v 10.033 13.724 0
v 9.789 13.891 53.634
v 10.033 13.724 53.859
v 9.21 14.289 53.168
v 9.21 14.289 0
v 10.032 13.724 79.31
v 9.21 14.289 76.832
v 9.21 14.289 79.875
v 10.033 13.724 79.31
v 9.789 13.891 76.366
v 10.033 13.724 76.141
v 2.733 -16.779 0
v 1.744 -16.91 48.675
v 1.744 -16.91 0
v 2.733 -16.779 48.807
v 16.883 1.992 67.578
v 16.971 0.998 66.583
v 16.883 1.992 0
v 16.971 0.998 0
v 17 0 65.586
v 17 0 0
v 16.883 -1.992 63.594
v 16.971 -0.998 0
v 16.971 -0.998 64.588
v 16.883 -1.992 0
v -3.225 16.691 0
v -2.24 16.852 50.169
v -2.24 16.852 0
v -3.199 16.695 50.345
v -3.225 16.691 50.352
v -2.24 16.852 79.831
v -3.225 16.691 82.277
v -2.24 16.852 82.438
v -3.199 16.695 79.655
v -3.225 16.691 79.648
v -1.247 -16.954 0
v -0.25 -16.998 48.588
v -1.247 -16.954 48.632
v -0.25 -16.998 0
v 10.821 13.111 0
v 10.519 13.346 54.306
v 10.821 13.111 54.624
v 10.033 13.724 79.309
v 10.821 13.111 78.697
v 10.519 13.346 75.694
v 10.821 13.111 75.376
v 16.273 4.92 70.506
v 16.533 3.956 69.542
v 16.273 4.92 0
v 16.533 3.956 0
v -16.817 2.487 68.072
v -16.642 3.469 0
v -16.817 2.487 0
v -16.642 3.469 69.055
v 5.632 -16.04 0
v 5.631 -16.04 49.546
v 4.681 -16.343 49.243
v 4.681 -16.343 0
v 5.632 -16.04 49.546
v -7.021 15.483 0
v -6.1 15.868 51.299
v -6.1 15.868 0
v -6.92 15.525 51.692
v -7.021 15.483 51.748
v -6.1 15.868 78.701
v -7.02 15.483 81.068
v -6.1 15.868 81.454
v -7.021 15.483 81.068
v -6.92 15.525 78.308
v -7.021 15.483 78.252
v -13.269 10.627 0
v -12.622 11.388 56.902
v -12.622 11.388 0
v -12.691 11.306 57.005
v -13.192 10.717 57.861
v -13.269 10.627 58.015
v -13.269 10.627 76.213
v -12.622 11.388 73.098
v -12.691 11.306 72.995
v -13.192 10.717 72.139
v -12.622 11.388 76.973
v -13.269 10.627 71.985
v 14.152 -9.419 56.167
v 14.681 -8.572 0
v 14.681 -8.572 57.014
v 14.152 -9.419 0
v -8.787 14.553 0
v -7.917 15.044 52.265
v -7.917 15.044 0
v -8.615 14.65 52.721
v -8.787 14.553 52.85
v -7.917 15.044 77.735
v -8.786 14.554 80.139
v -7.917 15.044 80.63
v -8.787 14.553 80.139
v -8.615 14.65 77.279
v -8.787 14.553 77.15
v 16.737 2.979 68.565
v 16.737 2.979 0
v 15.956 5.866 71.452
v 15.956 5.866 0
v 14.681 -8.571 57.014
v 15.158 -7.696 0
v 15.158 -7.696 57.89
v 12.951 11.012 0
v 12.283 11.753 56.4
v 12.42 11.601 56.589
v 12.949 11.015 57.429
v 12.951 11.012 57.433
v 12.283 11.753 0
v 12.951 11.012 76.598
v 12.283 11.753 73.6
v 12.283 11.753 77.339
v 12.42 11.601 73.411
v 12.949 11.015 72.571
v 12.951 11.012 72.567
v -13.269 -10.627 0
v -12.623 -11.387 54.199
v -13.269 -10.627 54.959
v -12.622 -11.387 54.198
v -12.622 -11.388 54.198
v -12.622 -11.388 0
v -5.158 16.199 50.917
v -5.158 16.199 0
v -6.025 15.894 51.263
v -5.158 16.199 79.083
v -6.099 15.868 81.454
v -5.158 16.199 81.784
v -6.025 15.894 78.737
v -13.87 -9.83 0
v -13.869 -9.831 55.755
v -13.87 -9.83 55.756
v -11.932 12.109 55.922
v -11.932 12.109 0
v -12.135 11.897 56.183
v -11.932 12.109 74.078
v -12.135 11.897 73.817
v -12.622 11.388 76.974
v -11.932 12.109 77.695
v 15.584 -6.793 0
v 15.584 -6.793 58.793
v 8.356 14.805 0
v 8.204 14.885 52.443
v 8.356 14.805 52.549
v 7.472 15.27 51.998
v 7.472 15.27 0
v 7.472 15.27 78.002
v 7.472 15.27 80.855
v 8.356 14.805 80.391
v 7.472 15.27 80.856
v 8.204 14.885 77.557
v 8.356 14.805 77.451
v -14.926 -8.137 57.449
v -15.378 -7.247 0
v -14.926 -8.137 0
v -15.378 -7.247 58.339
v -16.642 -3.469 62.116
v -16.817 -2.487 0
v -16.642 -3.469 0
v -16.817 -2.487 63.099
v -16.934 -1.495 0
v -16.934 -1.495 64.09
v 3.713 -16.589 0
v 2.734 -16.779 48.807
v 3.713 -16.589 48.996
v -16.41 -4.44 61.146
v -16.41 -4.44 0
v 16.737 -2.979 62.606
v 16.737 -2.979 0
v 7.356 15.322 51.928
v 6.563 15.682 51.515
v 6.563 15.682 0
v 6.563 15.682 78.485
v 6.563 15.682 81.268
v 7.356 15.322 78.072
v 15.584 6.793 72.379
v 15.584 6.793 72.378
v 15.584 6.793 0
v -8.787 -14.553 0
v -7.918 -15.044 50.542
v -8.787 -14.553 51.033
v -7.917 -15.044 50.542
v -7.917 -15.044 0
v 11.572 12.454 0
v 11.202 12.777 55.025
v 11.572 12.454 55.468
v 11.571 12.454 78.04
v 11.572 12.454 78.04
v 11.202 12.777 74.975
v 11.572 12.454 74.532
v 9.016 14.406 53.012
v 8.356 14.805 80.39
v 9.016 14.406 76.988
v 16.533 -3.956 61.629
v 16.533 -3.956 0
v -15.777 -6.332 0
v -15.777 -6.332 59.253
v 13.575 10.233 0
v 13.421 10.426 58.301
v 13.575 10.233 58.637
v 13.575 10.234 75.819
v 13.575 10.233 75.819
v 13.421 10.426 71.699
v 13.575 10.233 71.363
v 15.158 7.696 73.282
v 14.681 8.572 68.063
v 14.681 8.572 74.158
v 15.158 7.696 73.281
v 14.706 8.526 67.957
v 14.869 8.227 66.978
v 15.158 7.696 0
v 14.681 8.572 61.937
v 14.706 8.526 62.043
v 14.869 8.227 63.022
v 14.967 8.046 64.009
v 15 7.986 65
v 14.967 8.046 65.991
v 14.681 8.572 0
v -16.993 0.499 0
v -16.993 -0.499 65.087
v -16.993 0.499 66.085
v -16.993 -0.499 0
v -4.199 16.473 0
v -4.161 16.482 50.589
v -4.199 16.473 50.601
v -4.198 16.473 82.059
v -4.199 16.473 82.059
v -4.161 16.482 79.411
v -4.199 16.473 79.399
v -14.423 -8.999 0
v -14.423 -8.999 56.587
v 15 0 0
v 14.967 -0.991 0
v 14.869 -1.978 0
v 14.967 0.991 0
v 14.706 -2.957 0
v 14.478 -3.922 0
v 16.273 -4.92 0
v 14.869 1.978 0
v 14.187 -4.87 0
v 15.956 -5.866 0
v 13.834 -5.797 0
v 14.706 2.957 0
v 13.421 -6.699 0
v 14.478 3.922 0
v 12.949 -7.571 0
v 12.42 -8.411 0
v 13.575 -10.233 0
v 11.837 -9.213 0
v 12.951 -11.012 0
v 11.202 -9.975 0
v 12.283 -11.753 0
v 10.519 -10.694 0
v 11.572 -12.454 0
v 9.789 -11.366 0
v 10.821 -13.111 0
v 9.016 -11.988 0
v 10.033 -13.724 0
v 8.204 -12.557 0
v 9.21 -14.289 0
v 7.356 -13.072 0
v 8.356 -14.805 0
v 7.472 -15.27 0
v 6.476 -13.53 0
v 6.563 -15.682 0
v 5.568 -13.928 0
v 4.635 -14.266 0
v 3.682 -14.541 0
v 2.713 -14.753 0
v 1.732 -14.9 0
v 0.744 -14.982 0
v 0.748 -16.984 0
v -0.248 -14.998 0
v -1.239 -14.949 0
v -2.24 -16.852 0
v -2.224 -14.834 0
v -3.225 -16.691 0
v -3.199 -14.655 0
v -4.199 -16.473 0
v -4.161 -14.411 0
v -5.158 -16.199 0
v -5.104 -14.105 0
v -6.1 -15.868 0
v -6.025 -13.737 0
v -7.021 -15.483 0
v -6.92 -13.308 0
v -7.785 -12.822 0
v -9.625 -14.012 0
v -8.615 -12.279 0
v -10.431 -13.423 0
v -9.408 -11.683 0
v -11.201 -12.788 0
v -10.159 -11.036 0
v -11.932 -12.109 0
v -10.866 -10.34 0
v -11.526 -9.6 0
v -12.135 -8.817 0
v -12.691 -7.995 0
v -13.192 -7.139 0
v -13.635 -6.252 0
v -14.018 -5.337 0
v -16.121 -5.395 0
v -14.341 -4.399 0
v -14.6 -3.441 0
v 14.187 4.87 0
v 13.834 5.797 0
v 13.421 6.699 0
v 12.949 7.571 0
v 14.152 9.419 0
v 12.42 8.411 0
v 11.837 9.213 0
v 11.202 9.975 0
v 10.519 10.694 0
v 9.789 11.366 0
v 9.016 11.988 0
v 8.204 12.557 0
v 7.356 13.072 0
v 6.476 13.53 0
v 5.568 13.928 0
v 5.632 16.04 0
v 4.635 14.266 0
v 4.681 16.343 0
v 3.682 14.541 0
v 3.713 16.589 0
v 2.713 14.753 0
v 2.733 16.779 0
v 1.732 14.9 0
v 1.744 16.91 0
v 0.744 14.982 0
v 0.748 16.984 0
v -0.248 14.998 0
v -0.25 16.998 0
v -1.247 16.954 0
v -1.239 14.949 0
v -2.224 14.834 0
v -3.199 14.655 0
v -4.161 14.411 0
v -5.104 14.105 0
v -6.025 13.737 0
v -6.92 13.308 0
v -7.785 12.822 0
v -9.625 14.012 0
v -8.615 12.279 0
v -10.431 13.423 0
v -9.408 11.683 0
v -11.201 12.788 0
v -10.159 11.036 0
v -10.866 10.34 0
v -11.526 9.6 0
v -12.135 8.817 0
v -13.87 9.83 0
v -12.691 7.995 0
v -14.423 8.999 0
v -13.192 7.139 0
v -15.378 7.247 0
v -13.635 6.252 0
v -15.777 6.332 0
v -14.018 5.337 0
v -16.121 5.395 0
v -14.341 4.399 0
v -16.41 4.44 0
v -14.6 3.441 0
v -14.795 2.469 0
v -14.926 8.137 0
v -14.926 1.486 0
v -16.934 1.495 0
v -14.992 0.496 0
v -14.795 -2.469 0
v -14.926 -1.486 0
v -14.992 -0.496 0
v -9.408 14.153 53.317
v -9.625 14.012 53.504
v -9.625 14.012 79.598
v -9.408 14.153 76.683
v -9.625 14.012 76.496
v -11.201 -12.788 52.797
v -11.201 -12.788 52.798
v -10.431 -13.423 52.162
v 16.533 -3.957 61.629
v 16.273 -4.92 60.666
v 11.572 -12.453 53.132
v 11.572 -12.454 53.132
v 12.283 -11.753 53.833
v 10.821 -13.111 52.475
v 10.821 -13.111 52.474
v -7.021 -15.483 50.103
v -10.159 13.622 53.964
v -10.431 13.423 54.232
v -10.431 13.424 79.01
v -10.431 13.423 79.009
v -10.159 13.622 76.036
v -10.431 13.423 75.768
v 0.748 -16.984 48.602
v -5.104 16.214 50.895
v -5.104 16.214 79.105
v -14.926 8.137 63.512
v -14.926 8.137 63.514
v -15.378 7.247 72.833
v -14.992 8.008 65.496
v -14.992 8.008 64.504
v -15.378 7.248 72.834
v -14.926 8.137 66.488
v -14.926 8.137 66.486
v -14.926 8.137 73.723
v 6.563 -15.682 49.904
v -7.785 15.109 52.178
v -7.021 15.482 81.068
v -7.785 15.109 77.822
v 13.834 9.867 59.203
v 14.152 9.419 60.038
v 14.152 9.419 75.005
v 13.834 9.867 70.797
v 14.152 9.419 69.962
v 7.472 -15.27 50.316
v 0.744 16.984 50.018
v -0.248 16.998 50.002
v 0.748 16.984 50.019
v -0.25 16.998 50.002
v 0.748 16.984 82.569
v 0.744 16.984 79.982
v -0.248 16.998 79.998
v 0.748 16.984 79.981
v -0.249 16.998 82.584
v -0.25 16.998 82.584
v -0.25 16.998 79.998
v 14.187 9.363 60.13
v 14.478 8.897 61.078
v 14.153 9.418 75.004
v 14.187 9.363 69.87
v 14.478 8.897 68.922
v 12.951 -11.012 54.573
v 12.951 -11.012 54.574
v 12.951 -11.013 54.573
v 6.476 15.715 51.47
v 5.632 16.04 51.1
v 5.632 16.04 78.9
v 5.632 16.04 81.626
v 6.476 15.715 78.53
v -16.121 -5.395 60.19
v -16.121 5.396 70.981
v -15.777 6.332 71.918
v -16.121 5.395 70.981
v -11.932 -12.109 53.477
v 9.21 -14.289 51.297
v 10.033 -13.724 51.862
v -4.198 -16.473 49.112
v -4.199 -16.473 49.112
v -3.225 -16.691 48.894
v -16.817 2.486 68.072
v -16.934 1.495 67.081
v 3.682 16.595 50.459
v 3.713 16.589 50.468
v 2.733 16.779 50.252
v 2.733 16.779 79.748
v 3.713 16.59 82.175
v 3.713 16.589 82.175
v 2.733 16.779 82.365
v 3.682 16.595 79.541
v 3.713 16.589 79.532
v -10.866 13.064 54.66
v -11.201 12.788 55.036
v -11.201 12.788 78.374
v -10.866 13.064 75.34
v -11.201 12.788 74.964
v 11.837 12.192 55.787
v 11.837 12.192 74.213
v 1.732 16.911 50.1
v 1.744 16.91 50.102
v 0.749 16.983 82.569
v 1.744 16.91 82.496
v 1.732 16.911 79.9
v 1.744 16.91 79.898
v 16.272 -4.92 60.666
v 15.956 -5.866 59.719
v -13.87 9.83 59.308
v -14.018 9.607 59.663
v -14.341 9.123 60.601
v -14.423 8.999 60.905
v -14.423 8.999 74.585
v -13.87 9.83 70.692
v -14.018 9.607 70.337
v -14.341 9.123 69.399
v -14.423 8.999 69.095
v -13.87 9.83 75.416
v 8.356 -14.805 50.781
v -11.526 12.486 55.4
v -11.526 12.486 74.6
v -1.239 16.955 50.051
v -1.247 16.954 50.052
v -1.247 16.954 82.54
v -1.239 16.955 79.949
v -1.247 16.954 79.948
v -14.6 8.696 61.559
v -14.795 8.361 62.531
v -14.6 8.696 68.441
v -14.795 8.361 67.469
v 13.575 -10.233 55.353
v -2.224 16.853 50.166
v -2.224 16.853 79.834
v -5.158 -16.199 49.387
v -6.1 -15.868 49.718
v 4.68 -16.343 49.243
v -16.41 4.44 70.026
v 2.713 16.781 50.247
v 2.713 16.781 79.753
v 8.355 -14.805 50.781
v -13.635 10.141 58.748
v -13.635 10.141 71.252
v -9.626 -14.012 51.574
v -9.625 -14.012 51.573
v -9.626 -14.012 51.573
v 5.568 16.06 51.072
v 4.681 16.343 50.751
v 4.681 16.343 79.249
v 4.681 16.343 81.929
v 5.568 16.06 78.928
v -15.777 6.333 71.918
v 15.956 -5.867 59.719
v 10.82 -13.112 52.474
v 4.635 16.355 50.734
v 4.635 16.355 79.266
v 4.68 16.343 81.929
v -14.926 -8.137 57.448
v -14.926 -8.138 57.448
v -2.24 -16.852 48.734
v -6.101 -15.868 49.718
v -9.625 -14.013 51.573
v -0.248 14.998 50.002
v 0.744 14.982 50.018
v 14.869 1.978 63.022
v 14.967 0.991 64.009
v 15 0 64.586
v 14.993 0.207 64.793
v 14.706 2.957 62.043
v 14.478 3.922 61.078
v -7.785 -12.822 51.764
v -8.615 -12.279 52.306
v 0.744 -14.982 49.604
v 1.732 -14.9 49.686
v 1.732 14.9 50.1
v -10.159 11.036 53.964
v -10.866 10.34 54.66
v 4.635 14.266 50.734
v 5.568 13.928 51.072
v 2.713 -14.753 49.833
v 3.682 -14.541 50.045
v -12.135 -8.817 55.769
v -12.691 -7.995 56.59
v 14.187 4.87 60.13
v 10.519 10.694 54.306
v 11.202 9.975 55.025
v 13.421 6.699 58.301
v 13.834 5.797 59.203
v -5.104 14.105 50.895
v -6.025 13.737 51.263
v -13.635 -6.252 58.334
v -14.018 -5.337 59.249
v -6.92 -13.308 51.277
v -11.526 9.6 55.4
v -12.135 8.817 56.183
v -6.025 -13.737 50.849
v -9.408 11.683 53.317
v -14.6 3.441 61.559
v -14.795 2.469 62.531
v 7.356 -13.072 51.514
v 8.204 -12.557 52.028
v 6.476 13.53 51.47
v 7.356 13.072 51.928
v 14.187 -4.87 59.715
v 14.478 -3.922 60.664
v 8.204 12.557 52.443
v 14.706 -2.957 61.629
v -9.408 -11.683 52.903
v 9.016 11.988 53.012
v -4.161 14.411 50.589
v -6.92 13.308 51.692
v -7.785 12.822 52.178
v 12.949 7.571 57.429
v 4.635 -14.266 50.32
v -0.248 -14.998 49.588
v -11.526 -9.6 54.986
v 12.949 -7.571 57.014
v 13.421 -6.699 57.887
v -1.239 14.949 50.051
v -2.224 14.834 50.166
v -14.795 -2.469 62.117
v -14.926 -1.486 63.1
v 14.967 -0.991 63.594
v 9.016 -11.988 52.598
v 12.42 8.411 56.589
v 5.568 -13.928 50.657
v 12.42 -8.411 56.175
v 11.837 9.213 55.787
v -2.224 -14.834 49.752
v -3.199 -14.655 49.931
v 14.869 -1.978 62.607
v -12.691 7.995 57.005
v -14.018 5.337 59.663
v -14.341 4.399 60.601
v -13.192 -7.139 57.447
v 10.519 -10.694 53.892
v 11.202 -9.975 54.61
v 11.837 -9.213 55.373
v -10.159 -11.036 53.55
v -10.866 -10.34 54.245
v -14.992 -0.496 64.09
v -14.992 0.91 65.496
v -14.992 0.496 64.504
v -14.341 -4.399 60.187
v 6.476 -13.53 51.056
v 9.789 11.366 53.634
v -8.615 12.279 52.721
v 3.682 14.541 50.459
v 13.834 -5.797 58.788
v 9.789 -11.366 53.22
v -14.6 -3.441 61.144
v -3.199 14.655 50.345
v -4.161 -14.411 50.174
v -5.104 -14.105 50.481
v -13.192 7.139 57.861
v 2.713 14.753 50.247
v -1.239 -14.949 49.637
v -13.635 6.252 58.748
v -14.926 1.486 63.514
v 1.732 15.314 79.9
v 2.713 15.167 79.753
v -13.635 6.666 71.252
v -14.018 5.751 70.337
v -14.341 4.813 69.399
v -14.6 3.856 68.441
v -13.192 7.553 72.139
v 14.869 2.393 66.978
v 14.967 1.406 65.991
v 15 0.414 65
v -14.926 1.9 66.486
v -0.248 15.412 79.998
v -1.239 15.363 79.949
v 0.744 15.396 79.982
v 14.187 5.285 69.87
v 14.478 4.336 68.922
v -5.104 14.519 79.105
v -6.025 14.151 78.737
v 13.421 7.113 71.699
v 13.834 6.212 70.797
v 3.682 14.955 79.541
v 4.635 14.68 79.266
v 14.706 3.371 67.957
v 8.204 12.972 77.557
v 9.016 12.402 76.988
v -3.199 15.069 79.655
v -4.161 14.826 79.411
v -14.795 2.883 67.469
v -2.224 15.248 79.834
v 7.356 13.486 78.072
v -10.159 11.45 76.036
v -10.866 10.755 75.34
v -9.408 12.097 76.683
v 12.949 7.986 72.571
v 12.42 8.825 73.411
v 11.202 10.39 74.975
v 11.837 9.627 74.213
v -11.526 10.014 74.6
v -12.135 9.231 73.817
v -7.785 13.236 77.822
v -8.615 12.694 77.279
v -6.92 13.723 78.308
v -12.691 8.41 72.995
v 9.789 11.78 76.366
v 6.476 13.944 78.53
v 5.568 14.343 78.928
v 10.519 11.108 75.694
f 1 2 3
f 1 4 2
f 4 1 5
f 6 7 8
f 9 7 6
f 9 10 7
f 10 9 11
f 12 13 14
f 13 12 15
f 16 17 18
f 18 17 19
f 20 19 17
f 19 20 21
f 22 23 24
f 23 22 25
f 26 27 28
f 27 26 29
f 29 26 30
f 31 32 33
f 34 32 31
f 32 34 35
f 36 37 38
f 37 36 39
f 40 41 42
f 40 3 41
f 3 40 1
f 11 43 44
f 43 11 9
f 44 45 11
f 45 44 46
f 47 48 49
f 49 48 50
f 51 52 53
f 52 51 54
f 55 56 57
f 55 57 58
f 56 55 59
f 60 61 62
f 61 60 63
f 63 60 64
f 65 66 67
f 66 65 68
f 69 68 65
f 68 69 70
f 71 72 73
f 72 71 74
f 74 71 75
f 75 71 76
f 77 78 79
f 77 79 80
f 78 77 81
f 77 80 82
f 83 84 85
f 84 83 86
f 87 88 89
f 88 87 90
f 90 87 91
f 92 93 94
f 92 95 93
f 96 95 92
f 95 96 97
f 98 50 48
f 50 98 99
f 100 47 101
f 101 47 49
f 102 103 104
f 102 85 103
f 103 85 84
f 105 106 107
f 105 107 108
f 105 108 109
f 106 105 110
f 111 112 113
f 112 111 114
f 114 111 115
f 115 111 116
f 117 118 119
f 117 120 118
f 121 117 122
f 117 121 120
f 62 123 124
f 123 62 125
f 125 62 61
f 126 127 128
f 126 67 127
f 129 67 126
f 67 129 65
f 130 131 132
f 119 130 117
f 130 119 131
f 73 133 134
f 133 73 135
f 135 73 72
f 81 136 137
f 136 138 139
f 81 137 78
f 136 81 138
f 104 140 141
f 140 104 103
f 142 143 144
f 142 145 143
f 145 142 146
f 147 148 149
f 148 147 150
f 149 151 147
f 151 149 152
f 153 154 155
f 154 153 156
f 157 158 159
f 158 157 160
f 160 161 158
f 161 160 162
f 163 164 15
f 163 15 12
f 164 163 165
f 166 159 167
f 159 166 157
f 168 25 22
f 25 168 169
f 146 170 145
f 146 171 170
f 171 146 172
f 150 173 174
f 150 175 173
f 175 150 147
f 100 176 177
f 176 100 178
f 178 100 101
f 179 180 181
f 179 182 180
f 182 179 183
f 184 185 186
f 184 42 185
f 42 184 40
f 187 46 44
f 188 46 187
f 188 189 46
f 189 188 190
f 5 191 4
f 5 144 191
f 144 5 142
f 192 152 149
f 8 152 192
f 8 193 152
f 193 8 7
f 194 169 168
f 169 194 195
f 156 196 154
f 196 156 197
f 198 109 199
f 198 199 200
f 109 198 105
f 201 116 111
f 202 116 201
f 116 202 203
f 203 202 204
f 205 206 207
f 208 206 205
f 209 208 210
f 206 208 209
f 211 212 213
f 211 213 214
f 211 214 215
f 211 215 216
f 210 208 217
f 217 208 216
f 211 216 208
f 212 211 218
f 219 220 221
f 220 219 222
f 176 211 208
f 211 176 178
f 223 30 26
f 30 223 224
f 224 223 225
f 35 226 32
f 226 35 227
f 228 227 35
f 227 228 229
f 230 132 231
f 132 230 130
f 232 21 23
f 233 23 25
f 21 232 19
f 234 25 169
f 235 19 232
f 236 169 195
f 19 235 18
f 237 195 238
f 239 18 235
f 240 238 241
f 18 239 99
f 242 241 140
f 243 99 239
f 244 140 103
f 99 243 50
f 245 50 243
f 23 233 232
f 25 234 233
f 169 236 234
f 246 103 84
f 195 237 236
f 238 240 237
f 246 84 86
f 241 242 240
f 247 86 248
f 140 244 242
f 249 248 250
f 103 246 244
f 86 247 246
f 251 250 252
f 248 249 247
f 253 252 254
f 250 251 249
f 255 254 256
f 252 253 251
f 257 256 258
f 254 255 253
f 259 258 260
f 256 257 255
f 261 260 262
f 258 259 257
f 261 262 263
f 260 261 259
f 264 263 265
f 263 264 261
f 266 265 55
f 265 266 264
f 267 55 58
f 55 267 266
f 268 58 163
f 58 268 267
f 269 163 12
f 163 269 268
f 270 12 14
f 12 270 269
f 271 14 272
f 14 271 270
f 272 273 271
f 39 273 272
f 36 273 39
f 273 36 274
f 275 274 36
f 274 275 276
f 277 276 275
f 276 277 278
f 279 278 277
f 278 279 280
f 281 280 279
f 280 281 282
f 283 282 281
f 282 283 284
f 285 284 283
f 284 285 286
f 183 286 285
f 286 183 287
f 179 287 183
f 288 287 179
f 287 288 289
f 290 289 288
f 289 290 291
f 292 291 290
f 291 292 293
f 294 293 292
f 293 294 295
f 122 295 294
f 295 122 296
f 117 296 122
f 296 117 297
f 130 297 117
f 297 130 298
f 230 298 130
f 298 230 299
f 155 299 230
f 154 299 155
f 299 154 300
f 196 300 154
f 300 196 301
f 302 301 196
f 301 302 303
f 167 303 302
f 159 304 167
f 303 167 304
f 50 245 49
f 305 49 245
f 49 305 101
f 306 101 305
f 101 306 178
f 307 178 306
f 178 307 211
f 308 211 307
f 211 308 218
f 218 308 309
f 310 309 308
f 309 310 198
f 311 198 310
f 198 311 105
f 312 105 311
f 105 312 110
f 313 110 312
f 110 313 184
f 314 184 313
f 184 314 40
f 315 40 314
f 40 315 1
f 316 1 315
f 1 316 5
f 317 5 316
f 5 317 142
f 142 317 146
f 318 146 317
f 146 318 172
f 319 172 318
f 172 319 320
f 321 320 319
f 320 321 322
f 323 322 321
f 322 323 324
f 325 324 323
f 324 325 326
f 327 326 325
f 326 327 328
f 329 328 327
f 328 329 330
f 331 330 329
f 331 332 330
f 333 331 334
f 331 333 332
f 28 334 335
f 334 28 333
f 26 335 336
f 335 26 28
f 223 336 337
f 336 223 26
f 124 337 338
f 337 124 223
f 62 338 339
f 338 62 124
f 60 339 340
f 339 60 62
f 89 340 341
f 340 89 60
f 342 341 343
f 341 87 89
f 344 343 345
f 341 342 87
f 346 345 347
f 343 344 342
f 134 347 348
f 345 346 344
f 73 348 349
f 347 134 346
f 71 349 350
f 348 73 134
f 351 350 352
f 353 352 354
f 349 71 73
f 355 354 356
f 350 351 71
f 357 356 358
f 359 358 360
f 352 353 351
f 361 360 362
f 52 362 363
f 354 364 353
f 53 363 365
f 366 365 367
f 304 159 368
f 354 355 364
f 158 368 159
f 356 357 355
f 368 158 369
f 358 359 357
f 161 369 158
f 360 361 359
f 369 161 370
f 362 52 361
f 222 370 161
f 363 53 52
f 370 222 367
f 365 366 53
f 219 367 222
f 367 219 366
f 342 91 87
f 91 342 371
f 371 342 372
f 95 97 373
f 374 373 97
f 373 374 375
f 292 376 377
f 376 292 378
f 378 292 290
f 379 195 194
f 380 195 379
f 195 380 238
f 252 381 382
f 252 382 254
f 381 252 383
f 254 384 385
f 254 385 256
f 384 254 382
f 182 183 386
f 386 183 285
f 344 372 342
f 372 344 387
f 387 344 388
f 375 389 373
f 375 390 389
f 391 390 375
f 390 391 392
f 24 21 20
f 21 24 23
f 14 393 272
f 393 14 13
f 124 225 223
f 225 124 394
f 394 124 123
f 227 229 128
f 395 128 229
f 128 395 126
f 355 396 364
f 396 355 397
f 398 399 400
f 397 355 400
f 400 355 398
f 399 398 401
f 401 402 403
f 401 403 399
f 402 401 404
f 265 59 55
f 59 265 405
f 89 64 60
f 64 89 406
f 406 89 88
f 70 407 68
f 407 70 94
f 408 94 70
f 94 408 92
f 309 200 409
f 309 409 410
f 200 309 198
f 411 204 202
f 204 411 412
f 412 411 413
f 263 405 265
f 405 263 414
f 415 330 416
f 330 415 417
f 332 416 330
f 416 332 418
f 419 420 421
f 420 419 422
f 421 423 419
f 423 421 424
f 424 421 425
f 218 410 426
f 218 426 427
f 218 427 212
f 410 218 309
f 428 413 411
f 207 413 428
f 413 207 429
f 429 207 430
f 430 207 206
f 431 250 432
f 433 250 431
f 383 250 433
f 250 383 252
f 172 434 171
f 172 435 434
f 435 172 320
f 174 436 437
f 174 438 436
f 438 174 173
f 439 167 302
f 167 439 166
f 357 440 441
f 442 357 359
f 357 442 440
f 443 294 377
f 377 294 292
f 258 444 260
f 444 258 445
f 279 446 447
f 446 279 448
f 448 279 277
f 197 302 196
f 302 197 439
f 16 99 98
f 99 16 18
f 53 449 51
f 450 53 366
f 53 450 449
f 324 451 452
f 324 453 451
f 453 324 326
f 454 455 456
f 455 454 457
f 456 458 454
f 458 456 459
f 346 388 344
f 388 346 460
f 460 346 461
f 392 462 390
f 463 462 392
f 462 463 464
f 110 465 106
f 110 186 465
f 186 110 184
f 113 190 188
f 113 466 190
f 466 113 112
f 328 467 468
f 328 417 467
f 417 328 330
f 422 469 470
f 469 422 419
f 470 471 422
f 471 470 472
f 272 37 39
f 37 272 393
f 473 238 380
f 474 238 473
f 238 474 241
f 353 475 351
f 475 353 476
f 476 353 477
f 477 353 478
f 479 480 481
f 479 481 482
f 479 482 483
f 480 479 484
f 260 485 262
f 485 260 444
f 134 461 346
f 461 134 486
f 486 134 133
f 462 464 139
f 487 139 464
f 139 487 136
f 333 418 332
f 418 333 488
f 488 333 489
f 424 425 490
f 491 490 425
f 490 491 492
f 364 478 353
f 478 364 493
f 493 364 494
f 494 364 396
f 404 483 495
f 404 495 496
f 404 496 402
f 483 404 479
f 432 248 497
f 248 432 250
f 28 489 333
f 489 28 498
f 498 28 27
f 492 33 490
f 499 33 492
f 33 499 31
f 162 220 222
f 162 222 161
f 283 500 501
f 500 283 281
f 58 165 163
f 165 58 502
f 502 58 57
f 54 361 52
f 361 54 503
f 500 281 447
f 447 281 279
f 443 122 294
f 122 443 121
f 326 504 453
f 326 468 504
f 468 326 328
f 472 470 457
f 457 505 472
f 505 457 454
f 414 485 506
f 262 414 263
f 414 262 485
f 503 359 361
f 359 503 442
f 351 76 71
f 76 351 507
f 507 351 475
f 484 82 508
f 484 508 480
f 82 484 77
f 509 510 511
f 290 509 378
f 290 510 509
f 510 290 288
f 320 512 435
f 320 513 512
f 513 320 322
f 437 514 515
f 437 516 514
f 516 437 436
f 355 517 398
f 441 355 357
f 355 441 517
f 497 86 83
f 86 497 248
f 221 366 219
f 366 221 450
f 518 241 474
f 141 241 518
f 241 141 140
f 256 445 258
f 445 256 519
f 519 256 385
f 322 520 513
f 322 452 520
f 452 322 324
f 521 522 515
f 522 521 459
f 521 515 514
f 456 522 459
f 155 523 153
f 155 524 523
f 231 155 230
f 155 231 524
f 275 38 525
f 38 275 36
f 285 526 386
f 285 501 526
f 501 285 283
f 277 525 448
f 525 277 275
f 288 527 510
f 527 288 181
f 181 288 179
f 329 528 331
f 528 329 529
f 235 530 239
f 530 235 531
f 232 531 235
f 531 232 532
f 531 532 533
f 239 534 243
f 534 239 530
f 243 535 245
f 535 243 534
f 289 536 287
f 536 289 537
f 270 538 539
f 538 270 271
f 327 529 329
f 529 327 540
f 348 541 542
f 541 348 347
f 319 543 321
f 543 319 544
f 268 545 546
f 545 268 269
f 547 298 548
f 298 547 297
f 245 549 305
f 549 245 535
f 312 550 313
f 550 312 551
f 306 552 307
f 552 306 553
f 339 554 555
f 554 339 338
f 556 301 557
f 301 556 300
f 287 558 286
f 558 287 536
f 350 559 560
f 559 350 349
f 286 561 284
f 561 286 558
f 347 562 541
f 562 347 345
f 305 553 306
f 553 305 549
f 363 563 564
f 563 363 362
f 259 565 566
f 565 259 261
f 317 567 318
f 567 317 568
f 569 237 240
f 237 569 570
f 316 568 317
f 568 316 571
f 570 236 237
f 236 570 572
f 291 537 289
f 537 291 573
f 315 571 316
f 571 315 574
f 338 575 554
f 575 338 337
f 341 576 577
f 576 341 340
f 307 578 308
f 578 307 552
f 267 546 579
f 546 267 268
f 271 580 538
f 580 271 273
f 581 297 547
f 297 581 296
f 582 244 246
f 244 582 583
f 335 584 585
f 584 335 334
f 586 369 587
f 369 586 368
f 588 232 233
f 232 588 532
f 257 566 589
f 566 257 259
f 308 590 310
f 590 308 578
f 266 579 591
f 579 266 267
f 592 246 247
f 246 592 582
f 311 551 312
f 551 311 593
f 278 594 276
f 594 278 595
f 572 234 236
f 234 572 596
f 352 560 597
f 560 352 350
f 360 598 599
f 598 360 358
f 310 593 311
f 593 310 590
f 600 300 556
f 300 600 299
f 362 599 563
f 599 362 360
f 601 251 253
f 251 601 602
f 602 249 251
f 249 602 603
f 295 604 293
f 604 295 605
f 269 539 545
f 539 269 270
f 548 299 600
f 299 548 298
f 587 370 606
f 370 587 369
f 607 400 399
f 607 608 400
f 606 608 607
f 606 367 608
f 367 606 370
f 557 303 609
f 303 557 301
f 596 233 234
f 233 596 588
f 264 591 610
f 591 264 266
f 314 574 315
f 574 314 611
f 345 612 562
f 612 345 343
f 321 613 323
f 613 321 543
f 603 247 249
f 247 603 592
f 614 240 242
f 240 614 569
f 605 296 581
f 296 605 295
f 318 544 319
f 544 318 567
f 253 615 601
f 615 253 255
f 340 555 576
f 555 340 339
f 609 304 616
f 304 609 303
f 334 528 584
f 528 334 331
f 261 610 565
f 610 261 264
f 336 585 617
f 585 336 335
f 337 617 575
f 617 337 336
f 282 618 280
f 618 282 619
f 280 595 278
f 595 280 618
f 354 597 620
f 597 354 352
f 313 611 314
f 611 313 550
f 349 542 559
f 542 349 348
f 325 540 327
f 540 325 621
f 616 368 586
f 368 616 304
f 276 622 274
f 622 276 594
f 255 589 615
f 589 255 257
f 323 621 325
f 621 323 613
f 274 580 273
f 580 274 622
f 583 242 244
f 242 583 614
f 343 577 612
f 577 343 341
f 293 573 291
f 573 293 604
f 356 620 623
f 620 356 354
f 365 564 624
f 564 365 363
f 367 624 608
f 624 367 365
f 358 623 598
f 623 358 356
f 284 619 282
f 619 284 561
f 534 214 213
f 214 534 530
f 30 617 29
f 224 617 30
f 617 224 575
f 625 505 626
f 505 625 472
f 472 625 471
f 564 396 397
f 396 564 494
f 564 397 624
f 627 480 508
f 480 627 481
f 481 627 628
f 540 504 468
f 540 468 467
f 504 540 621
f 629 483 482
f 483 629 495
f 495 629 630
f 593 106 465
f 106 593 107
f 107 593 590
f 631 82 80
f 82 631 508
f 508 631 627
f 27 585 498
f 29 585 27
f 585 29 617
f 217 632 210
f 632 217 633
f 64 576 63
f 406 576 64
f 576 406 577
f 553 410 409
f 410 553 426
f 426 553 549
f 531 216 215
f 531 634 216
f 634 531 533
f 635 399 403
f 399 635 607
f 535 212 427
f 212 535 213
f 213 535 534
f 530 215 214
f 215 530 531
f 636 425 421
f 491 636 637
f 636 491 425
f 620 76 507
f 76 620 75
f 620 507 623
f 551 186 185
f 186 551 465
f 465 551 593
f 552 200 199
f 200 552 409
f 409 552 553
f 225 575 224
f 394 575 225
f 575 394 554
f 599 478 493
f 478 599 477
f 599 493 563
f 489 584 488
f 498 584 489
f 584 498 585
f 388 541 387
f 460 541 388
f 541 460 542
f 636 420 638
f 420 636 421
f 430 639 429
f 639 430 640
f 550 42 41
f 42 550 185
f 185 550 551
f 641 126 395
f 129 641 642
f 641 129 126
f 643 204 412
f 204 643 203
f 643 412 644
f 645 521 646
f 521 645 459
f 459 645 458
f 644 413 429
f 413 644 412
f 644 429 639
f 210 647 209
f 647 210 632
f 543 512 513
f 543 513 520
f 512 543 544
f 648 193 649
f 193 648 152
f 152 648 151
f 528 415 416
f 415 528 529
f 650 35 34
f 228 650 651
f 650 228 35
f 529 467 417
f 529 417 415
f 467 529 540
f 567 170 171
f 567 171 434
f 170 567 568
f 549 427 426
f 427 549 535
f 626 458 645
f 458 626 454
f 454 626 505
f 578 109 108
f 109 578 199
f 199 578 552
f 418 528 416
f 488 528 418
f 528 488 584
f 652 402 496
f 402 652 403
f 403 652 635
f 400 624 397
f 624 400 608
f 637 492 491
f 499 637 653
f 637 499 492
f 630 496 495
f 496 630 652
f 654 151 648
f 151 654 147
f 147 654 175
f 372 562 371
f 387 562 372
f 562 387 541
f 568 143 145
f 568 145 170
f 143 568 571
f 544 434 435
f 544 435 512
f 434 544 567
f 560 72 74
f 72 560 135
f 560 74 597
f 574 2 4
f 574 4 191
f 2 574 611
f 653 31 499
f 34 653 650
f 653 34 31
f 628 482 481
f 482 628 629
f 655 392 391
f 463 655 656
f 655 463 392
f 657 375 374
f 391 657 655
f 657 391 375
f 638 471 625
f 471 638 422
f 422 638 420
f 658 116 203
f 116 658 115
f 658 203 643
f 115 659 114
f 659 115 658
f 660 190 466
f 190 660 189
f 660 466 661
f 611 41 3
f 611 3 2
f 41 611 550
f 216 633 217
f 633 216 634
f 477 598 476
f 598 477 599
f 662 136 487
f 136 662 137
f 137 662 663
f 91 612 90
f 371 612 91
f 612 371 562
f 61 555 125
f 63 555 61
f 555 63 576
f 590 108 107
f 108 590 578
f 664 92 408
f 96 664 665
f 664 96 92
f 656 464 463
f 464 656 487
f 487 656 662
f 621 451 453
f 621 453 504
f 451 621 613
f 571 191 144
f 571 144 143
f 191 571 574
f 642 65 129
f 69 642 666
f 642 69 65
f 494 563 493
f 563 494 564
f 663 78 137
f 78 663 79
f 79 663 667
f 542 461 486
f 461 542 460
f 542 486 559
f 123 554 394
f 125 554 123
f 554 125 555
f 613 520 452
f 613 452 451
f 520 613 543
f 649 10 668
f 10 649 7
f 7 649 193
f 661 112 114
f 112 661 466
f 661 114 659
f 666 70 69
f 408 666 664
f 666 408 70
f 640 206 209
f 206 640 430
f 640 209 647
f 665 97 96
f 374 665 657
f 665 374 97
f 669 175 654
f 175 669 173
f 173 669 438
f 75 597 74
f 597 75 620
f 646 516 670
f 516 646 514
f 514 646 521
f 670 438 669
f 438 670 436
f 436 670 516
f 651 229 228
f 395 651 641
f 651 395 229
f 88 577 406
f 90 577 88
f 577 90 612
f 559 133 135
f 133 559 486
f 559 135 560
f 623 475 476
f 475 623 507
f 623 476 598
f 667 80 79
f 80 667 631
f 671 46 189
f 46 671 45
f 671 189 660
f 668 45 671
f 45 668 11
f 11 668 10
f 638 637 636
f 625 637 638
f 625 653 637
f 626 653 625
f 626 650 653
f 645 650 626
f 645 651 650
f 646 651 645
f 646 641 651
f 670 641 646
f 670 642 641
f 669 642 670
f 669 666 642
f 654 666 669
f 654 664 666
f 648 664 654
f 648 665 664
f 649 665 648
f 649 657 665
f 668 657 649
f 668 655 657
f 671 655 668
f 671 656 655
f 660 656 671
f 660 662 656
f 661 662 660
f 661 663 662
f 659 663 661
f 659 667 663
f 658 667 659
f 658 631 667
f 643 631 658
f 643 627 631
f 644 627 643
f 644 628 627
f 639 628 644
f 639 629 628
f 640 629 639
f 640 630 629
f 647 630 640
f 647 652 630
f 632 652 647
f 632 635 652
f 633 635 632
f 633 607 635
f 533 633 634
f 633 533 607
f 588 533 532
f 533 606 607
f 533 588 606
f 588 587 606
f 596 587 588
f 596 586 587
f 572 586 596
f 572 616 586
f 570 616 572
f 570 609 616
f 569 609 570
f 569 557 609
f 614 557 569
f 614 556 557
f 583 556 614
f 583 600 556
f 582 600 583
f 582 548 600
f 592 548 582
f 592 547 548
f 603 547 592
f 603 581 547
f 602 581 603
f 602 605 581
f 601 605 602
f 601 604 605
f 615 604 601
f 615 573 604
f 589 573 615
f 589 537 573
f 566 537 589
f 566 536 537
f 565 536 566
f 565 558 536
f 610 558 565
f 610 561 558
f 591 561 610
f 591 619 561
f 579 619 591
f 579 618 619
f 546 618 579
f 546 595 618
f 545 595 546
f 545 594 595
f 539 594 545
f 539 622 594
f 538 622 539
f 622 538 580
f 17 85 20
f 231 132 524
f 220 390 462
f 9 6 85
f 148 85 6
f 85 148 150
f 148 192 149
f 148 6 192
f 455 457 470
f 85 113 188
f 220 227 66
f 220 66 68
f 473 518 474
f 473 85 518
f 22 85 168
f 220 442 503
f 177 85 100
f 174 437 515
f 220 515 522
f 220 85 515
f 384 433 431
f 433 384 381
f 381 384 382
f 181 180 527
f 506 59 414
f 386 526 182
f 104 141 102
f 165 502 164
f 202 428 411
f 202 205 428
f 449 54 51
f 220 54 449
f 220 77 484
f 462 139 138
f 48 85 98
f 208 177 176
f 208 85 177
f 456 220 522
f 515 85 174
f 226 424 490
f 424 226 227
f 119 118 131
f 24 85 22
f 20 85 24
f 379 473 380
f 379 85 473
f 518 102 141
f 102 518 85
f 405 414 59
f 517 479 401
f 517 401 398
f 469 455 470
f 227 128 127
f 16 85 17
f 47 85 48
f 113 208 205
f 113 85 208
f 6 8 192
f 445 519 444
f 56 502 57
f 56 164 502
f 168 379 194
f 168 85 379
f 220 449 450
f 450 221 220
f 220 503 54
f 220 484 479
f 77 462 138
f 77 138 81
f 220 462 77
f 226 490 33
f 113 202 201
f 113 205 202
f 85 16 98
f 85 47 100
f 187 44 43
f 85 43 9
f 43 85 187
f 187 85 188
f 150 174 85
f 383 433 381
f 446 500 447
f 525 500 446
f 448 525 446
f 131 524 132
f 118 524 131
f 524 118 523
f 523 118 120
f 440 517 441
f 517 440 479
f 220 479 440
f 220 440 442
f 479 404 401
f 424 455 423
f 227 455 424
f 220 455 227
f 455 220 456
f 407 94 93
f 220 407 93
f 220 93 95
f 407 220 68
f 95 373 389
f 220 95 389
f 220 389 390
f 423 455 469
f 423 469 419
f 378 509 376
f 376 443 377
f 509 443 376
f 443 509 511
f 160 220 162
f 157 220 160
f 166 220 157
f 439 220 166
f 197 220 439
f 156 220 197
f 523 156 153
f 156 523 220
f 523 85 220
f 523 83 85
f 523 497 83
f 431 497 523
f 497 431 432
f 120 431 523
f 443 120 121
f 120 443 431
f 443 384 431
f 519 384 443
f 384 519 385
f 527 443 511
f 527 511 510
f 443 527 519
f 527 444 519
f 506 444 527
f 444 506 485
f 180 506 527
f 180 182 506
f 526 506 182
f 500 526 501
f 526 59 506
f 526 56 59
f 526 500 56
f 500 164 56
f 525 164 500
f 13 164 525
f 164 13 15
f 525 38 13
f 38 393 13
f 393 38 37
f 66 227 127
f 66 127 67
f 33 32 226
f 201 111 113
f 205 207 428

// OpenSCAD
/*
 * This work by John Strunk is licensed under the Creative Commons
 * Attribution-ShareAlike 4.0 International License. To view a copy of
 * this license, visit http://creativecommons.org/licenses/by-sa/4.0/
 * or send a letter to Creative Commons, 444 Castro Street, Suite 900,
 * Mountain View, California, 94041, USA.
 *
 * This object is used to make a child's periscope toy.
 * Print two out these and place them on the ends of a paper towel roll. You will also
 * need to affix mirrors to the inside of teh slanted portion of these end caps.
 *
 * Bugs:
 *   - tube_ins should be able to be decreased toward 0, but it causes bad clipping
 *     on the clyinder.
 */
 
wall_t   = 2;   // Thickness of the periscope tube walls
tube_d   = 30;  // Outside diameter of the paper towel roll
tube_ins = 50;  // How far the towel roll should insert into the periscope end

_ep = 1e-6;
$fa = 1;
$fs = 1;
 

mask_size = 4*(tube_d + 2*wall_t);

module outerCyl() {
    cylinder(h = tube_ins + tube_d + 2*wall_t, r = tube_d/2 + wall_t);
}

module innerCyl() {
    cylinder(h = tube_ins + tube_d + 2*wall_t + 2*_ep, r = tube_d/2);
}

module viewCutter() {
    translate([0, -tube_d/2-wall_t-tube_ins/2, tube_ins + tube_d/2])
        rotate([-90, 0, 0])
            innerCyl();
}

module mainTube() {
    difference() {
        outerCyl();
        translate([0, 0, -_ep]) innerCyl();
        viewCutter();
    }
}

module topCap() {
    intersection() {
        translate([0, 0, -2*(tube_d+wall_t)]) outerCyl();
        rotate([45, 0, 0]) {
            cube([mask_size, mask_size, wall_t], center=true);
        }
    }
}

module topMask() {
    scale(1+_ep) {
        hull() {
            topCap();
            translate([0, 0, mask_size]) topCap();
        }
    }
}

difference() {
    union() {
        mainTube();
        translate([0, 0, tube_ins + tube_d/2 + wall_t/2]) topCap();
    }
    translate([0, 0, tube_ins + tube_d/2 + wall_t]) topMask();
}
